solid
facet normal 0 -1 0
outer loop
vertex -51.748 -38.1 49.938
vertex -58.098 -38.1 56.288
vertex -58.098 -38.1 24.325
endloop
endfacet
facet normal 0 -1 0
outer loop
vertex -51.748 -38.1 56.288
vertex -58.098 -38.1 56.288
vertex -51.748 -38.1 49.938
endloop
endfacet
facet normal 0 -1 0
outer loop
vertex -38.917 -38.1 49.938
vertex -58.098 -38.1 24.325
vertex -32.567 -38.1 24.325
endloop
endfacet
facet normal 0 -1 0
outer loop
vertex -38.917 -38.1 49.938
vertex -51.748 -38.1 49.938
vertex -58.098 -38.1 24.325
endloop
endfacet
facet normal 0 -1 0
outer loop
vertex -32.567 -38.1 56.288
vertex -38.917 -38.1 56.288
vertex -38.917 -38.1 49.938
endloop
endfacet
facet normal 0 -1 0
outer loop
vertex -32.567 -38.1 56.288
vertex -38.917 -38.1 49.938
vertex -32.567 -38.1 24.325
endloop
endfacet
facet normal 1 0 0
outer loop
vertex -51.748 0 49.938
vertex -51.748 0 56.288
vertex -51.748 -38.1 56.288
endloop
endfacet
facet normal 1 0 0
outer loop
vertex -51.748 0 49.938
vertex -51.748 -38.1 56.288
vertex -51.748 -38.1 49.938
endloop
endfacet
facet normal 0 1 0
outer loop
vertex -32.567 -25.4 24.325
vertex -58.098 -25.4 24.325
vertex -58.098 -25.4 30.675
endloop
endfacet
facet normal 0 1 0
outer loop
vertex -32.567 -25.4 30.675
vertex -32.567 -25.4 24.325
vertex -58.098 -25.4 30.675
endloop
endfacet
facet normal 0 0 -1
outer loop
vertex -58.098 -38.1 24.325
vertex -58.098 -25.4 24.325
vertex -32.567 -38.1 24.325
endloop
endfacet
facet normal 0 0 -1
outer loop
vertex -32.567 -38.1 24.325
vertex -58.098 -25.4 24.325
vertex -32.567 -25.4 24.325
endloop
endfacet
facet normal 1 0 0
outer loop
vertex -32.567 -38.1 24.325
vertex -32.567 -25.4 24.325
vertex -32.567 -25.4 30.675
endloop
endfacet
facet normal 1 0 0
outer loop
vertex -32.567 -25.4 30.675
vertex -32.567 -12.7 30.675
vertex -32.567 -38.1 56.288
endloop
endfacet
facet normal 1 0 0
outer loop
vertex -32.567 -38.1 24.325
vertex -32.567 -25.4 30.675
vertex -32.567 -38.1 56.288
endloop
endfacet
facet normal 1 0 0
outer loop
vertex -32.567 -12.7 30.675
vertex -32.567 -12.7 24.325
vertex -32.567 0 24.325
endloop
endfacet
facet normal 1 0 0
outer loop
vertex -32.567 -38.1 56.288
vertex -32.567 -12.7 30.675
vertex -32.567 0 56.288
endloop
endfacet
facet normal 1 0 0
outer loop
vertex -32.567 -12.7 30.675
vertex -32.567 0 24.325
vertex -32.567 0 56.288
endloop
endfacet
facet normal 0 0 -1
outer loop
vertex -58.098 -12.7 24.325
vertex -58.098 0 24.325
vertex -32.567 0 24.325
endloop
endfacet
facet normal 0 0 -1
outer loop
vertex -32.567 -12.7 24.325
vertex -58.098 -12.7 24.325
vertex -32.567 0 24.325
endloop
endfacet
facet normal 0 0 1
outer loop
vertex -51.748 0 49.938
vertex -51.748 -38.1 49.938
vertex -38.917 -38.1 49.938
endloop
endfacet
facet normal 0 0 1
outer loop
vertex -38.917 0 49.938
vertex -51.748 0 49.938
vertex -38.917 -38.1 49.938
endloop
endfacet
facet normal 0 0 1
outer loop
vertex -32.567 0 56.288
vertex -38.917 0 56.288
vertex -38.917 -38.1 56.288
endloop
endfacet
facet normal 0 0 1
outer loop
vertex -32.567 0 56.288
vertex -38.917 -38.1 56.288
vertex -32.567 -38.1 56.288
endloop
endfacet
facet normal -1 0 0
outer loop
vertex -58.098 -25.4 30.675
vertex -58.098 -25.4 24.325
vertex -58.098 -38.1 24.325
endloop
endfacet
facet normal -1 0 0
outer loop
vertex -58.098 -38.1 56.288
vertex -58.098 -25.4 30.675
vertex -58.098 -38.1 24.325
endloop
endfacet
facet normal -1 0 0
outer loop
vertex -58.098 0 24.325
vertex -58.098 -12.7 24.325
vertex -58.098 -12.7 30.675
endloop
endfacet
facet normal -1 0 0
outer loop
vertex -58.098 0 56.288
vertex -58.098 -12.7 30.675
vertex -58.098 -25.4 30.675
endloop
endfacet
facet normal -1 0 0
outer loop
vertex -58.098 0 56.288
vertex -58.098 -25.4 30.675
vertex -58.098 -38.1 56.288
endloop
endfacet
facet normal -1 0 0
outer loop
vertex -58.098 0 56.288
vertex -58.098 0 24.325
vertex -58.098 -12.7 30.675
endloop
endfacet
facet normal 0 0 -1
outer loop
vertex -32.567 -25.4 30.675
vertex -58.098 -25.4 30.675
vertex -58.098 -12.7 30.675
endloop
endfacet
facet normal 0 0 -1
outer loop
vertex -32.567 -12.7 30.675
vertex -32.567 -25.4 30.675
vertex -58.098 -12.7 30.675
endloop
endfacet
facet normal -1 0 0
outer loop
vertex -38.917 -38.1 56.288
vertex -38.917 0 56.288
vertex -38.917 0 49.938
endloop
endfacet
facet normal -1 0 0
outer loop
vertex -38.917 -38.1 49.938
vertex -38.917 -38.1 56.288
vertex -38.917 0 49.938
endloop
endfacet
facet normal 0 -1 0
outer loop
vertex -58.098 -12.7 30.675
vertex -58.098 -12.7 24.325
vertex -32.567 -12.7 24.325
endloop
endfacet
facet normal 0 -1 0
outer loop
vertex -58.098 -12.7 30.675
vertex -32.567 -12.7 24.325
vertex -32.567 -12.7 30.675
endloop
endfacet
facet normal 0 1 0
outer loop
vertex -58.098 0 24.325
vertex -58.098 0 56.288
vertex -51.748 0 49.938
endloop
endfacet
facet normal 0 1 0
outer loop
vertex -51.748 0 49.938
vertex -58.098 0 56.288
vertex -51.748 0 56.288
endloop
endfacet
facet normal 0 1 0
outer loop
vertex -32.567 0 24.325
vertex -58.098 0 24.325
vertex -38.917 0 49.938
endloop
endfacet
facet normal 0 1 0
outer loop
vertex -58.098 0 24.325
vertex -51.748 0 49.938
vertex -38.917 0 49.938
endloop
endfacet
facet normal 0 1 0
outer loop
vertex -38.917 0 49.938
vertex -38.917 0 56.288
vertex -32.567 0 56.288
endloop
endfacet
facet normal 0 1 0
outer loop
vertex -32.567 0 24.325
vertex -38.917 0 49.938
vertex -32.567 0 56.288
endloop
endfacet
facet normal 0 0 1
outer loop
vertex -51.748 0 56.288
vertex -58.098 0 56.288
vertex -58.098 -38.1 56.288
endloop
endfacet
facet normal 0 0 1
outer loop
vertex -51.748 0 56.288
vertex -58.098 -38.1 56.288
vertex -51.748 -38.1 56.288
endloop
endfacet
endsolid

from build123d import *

# Parameters (mm, degrees)
F0_W     = 25.530833751
F0_H     = 31.9637935609
F1_DEPTH = 25.4
F2_W     = 12.830833751
F2_H     = 6.35
F3_DEPTH = 25.401
F4_DEPTH = 12.7
F5_W     = 12.7
F5_H     = 6.35
F6_DEPTH = 25.531833751


with BuildPart() as f1:
    # F0 (on Front) → F1 (new body)
    with BuildSketch(Plane.XZ):
        with Locations((-45.3322995454, 40.3065467253)):
            Rectangle(F0_W, F0_H)
    extrude(amount=F1_DEPTH)

    # F2 (on face) → F3 (cut, through all)
    with BuildSketch(Plane(origin=(0, 0, 0), x_dir=(-1, 0, 0), z_dir=(0, 1, 0))):
        with Locations((45.3322995454, 53.1134435058)):
            Rectangle(F2_W, F2_H)
    extrude(amount=-F3_DEPTH, mode=Mode.SUBTRACT)

    # F4 (add): a face of the model
    f4_faces = [f1.faces().sort_by_distance(p)[0] for p in [
        (-45.3322995454, -25.4, 38.8860849),
    ]]
    extrude(f4_faces, amount=F4_DEPTH)

    # F5 (on face) → F6 (cut, through all)
    with BuildSketch(Plane.YZ.offset(-32.5668826699)):
        with Locations((-19.05, 27.4996499449)):
            Rectangle(F5_W, F5_H)
    extrude(amount=-F6_DEPTH, mode=Mode.SUBTRACT)


solid = f1.part
